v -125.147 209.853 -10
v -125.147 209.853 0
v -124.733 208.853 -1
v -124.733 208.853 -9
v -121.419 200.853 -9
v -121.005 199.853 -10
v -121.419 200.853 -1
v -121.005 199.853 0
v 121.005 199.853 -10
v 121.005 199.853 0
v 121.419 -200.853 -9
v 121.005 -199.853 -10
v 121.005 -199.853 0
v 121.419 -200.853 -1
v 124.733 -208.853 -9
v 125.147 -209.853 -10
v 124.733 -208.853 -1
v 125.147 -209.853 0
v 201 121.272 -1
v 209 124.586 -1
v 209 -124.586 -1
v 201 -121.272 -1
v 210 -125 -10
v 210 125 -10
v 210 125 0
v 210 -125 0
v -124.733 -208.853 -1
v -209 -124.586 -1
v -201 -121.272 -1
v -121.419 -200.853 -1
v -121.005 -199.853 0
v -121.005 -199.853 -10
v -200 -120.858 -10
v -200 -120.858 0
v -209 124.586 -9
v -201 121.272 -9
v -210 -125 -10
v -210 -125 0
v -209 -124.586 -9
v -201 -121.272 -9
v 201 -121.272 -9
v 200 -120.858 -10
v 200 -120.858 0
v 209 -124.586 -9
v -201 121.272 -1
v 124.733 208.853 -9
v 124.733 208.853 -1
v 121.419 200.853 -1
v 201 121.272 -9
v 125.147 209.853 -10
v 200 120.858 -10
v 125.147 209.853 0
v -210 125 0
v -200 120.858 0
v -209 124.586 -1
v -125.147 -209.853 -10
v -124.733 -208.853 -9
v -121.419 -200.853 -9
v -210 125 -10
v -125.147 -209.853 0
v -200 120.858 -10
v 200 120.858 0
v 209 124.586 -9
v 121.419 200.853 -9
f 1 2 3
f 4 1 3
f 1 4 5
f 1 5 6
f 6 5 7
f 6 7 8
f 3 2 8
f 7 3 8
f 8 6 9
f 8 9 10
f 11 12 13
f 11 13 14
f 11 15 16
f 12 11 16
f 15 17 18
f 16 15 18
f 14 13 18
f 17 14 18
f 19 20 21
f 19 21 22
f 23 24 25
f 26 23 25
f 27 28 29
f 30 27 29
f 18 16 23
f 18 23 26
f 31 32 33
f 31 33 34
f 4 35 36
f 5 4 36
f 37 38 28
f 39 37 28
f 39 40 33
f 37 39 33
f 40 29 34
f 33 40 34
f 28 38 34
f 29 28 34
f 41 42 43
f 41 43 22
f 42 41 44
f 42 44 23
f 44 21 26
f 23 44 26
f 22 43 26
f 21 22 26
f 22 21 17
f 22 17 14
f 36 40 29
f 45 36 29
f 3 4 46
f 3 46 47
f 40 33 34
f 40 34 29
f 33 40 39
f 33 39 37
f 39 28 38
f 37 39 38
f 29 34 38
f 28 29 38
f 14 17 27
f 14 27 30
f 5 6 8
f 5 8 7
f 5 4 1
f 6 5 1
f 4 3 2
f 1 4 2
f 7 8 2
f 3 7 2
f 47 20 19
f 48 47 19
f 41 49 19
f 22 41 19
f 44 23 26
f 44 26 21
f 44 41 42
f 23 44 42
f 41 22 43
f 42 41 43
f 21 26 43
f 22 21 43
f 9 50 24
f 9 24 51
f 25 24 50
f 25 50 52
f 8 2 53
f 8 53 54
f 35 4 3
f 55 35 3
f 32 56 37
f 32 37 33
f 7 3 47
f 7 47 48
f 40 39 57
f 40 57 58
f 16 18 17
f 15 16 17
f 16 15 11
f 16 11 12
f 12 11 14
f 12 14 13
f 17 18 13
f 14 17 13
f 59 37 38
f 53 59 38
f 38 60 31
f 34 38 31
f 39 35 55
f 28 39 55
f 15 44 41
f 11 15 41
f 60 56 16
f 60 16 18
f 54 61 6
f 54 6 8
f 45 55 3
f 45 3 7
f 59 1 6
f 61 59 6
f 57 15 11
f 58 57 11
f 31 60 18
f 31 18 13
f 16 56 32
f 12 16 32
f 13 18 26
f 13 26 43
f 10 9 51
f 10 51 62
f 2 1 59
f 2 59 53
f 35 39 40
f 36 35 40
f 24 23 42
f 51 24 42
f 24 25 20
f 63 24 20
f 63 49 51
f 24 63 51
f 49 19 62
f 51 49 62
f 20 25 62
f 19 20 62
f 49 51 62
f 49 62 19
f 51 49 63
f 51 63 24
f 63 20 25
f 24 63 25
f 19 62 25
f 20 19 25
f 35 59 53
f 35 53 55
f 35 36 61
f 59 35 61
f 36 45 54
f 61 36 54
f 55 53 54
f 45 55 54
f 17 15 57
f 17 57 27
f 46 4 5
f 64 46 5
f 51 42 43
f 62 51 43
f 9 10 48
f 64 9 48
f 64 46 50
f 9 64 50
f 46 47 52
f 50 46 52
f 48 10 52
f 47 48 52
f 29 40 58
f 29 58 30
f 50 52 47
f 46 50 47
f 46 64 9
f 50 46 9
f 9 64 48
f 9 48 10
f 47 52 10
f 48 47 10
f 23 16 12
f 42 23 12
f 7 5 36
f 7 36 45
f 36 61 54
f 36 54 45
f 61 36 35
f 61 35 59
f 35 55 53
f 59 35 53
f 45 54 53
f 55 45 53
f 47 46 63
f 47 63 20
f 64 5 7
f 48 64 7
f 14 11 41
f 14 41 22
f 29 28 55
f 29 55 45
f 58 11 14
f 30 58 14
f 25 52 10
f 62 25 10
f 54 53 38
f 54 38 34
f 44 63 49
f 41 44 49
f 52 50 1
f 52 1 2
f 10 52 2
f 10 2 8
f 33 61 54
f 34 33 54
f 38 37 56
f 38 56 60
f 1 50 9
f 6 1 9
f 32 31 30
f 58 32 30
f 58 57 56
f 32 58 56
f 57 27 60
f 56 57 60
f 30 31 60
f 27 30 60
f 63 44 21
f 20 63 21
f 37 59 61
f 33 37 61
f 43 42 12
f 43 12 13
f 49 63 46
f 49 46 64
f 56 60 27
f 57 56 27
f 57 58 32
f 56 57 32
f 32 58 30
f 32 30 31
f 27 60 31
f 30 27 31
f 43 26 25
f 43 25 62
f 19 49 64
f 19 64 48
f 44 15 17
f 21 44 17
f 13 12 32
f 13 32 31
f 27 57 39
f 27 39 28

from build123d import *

# Parameters (mm, degrees)
MEMBER_1_DEPTH            = 257.152236891
MEMBER_1_DEPTH_BACK       = 6.857864376
SKETCH11_W                = 10
SKETCH11_H                = 10
SKETCH11_W_2              = 8
SKETCH11_H_2              = 8
SKETCH11_ON_SEGMENT_2_W   = 10
SKETCH11_ON_SEGMENT_2_H   = 10
SKETCH11_ON_SEGMENT_2_W_2 = 8
SKETCH11_ON_SEGMENT_2_H_2 = 8
MEMBER_1_2_DEPTH          = 133.715728753
SKETCH11_ON_SEGMENT_3_W   = 10
SKETCH11_ON_SEGMENT_3_H   = 10
SKETCH11_ON_SEGMENT_3_W_2 = 8
SKETCH11_ON_SEGMENT_3_H_2 = 8
MEMBER_1_3_DEPTH          = 263.715728753
SKETCH11_ON_SEGMENT_4_W   = 10
SKETCH11_ON_SEGMENT_4_H   = 10
SKETCH11_ON_SEGMENT_4_W_2 = 8
SKETCH11_ON_SEGMENT_4_H_2 = 8
MEMBER_1_4_DEPTH          = 133.715728753
SKETCH11_ON_SEGMENT_5_W   = 10
SKETCH11_ON_SEGMENT_5_H   = 10
SKETCH11_ON_SEGMENT_5_W_2 = 8
SKETCH11_ON_SEGMENT_5_H_2 = 8
MEMBER_1_5_DEPTH          = 264.010101268
SKETCH11_ON_SEGMENT_6_W   = 10
SKETCH11_ON_SEGMENT_6_H   = 10
SKETCH11_ON_SEGMENT_6_W_2 = 8
SKETCH11_ON_SEGMENT_6_H_2 = 8
MEMBER_1_6_DEPTH          = 133.715728753
SKETCH11_ON_SEGMENT_7_W   = 10
SKETCH11_ON_SEGMENT_7_H   = 10
SKETCH11_ON_SEGMENT_7_W_2 = 8
SKETCH11_ON_SEGMENT_7_H_2 = 8
MEMBER_1_7_DEPTH          = 263.715728753
SKETCH11_ON_SEGMENT_8_W   = 10
SKETCH11_ON_SEGMENT_8_H   = 10
SKETCH11_ON_SEGMENT_8_W_2 = 8
SKETCH11_ON_SEGMENT_8_H_2 = 8
MEMBER_1_8_DEPTH          = 133.715728753


with BuildPart() as part:
    # Sketch11 → Member 1 (new, two sides: drawn at the far end of the back side and taken through both)
    with BuildSketch(Plane(origin=(-125.147186258, -204.852813742, -5), x_dir=(0, 1, 0), z_dir=(1, 0, 0)).offset(-MEMBER_1_DEPTH_BACK)):
        Rectangle(SKETCH11_W, SKETCH11_H)
        Rectangle(SKETCH11_W_2, SKETCH11_H_2, mode=Mode.SUBTRACT)
    extrude(amount=MEMBER_1_DEPTH + MEMBER_1_DEPTH_BACK)

    # Member 1 mitre 1
    split(bisect_by=Plane(origin=(-125.147186258, -209.852813742, 0), x_dir=(0.382683432, 0.923879533, 0), z_dir=(0.923879533, -0.382683432, 0)), keep=Keep.TOP)

    # Member 1 mitre 2
    split(bisect_by=Plane(origin=(125.147186258, -209.852813742, 0), x_dir=(0.382683432, -0.923879533, 0), z_dir=(-0.923879533, -0.382683432, 0)), keep=Keep.TOP)


with BuildPart() as body_2:
    # Sketch11 on segment 2 (carried to segment 2) → Member 1 2 (new body)
    with BuildSketch(Plane(origin=(116.762409947, -211.166522241, -5), x_dir=(-0.707106781, 0.707106781, 0), z_dir=(0.707106781, 0.707106781, 0))):
        Rectangle(SKETCH11_ON_SEGMENT_2_W, SKETCH11_ON_SEGMENT_2_H)
        Rectangle(SKETCH11_ON_SEGMENT_2_W_2, SKETCH11_ON_SEGMENT_2_H_2, mode=Mode.SUBTRACT)
    extrude(amount=MEMBER_1_2_DEPTH)

    # Member 1 2 mitre 1
    split(bisect_by=Plane(origin=(125.147186258, -209.852813742, 0), x_dir=(-0.382683432, 0.923879533, 0), z_dir=(0.923879533, 0.382683432, 0)), keep=Keep.TOP)

    # Member 1 2 mitre 2
    split(bisect_by=Plane(origin=(210, -125, 0), x_dir=(0.923879533, -0.382683432, 0), z_dir=(-0.382683432, -0.923879533, 0)), keep=Keep.TOP)


with BuildPart() as body_3:
    # Sketch11 on segment 3 (carried to segment 3) → Member 1 3 (new body)
    with BuildSketch(Plane(origin=(205, -131.857864376, -5), x_dir=(-1, 0, 0), z_dir=(0, 1, 0))):
        Rectangle(SKETCH11_ON_SEGMENT_3_W, SKETCH11_ON_SEGMENT_3_H)
        Rectangle(SKETCH11_ON_SEGMENT_3_W_2, SKETCH11_ON_SEGMENT_3_H_2, mode=Mode.SUBTRACT)
    extrude(amount=MEMBER_1_3_DEPTH)

    # Member 1 3 mitre 1
    split(bisect_by=Plane(origin=(210, -125, 0), x_dir=(-0.923879533, 0.382683432, 0), z_dir=(0.382683432, 0.923879533, 0)), keep=Keep.TOP)

    # Member 1 3 mitre 2
    split(bisect_by=Plane(origin=(210, 125, 0), x_dir=(0.923879533, 0.382683432, 0), z_dir=(0.382683432, -0.923879533, 0)), keep=Keep.TOP)


with BuildPart() as body_4:
    # Sketch11 on segment 4 (carried to segment 4) → Member 1 4 (new body)
    with BuildSketch(Plane(origin=(211.313708499, 116.615223689, -5), x_dir=(-0.707106781, -0.707106781, 0), z_dir=(-0.707106781, 0.707106781, 0))):
        Rectangle(SKETCH11_ON_SEGMENT_4_W, SKETCH11_ON_SEGMENT_4_H)
        Rectangle(SKETCH11_ON_SEGMENT_4_W_2, SKETCH11_ON_SEGMENT_4_H_2, mode=Mode.SUBTRACT)
    extrude(amount=MEMBER_1_4_DEPTH)

    # Member 1 4 mitre 1
    split(bisect_by=Plane(origin=(210, 125, 0), x_dir=(-0.923879533, -0.382683432, 0), z_dir=(-0.382683432, 0.923879533, 0)), keep=Keep.TOP)

    # Member 1 4 mitre 2
    split(bisect_by=Plane(origin=(125.147186258, 209.852813742, 0), x_dir=(0.382683432, 0.923879533, 0), z_dir=(0.923879533, -0.382683432, 0)), keep=Keep.TOP)


with BuildPart() as body_5:
    # Sketch11 on segment 5 (carried to segment 5) → Member 1 5 (new body)
    with BuildSketch(Plane(origin=(132.005050634, 204.852813742, -5), x_dir=(0, -1, 0), z_dir=(-1, 0, 0))):
        Rectangle(SKETCH11_ON_SEGMENT_5_W, SKETCH11_ON_SEGMENT_5_H)
        Rectangle(SKETCH11_ON_SEGMENT_5_W_2, SKETCH11_ON_SEGMENT_5_H_2, mode=Mode.SUBTRACT)
    extrude(amount=MEMBER_1_5_DEPTH)

    # Member 1 5 mitre 1
    split(bisect_by=Plane(origin=(-125.147186258, 209.852813742, 0), x_dir=(-0.382683432, 0.923879533, 0), z_dir=(0.923879533, 0.382683432, 0)), keep=Keep.TOP)

    # Member 1 5 mitre 2
    split(bisect_by=Plane(origin=(125.147186258, 209.852813742, 0), x_dir=(-0.382683432, -0.923879533, 0), z_dir=(-0.923879533, 0.382683432, 0)), keep=Keep.TOP)


with BuildPart() as body_6:
    # Sketch11 on segment 6 (carried to segment 6) → Member 1 6 (new body)
    with BuildSketch(Plane(origin=(-116.762409947, 211.166522241, -5), x_dir=(0.707106781, -0.707106781, 0), z_dir=(-0.707106781, -0.707106781, 0))):
        Rectangle(SKETCH11_ON_SEGMENT_6_W, SKETCH11_ON_SEGMENT_6_H)
        Rectangle(SKETCH11_ON_SEGMENT_6_W_2, SKETCH11_ON_SEGMENT_6_H_2, mode=Mode.SUBTRACT)
    extrude(amount=MEMBER_1_6_DEPTH)

    # Member 1 6 mitre 1
    split(bisect_by=Plane(origin=(-210, 125, 0), x_dir=(-0.923879533, 0.382683432, 0), z_dir=(0.382683432, 0.923879533, 0)), keep=Keep.TOP)

    # Member 1 6 mitre 2
    split(bisect_by=Plane(origin=(-125.147186258, 209.852813742, 0), x_dir=(0.382683432, -0.923879533, 0), z_dir=(-0.923879533, -0.382683432, 0)), keep=Keep.TOP)


with BuildPart() as body_7:
    # Sketch11 on segment 7 (carried to segment 7) → Member 1 7 (new body)
    with BuildSketch(Plane(origin=(-205, 131.857864376, -5), x_dir=(1, 0, 0), z_dir=(0, -1, 0))):
        Rectangle(SKETCH11_ON_SEGMENT_7_W, SKETCH11_ON_SEGMENT_7_H)
        Rectangle(SKETCH11_ON_SEGMENT_7_W_2, SKETCH11_ON_SEGMENT_7_H_2, mode=Mode.SUBTRACT)
    extrude(amount=MEMBER_1_7_DEPTH)

    # Member 1 7 mitre 1
    split(bisect_by=Plane(origin=(-210, -125, 0), x_dir=(-0.923879533, -0.382683432, 0), z_dir=(-0.382683432, 0.923879533, 0)), keep=Keep.TOP)

    # Member 1 7 mitre 2
    split(bisect_by=Plane(origin=(-210, 125, 0), x_dir=(0.923879533, -0.382683432, 0), z_dir=(-0.382683432, -0.923879533, 0)), keep=Keep.TOP)


with BuildPart() as body_8:
    # Sketch11 on segment 8 (carried to segment 8) → Member 1 8 (new body)
    with BuildSketch(Plane(origin=(-211.313708499, -116.615223689, -5), x_dir=(0.707106781, 0.707106781, 0), z_dir=(0.707106781, -0.707106781, 0))):
        Rectangle(SKETCH11_ON_SEGMENT_8_W, SKETCH11_ON_SEGMENT_8_H)
        Rectangle(SKETCH11_ON_SEGMENT_8_W_2, SKETCH11_ON_SEGMENT_8_H_2, mode=Mode.SUBTRACT)
    extrude(amount=MEMBER_1_8_DEPTH)

    # Member 1 8 mitre 1
    split(bisect_by=Plane(origin=(-125.147186258, -209.852813742, 0), x_dir=(-0.382683432, -0.923879533, 0), z_dir=(-0.923879533, 0.382683432, 0)), keep=Keep.TOP)

    # Member 1 8 mitre 2
    split(bisect_by=Plane(origin=(-210, -125, 0), x_dir=(0.923879533, 0.382683432, 0), z_dir=(0.382683432, -0.923879533, 0)), keep=Keep.TOP)


solid = Compound([part.part, body_2.part, body_3.part, body_4.part, body_5.part, body_6.part, body_7.part, body_8.part])
